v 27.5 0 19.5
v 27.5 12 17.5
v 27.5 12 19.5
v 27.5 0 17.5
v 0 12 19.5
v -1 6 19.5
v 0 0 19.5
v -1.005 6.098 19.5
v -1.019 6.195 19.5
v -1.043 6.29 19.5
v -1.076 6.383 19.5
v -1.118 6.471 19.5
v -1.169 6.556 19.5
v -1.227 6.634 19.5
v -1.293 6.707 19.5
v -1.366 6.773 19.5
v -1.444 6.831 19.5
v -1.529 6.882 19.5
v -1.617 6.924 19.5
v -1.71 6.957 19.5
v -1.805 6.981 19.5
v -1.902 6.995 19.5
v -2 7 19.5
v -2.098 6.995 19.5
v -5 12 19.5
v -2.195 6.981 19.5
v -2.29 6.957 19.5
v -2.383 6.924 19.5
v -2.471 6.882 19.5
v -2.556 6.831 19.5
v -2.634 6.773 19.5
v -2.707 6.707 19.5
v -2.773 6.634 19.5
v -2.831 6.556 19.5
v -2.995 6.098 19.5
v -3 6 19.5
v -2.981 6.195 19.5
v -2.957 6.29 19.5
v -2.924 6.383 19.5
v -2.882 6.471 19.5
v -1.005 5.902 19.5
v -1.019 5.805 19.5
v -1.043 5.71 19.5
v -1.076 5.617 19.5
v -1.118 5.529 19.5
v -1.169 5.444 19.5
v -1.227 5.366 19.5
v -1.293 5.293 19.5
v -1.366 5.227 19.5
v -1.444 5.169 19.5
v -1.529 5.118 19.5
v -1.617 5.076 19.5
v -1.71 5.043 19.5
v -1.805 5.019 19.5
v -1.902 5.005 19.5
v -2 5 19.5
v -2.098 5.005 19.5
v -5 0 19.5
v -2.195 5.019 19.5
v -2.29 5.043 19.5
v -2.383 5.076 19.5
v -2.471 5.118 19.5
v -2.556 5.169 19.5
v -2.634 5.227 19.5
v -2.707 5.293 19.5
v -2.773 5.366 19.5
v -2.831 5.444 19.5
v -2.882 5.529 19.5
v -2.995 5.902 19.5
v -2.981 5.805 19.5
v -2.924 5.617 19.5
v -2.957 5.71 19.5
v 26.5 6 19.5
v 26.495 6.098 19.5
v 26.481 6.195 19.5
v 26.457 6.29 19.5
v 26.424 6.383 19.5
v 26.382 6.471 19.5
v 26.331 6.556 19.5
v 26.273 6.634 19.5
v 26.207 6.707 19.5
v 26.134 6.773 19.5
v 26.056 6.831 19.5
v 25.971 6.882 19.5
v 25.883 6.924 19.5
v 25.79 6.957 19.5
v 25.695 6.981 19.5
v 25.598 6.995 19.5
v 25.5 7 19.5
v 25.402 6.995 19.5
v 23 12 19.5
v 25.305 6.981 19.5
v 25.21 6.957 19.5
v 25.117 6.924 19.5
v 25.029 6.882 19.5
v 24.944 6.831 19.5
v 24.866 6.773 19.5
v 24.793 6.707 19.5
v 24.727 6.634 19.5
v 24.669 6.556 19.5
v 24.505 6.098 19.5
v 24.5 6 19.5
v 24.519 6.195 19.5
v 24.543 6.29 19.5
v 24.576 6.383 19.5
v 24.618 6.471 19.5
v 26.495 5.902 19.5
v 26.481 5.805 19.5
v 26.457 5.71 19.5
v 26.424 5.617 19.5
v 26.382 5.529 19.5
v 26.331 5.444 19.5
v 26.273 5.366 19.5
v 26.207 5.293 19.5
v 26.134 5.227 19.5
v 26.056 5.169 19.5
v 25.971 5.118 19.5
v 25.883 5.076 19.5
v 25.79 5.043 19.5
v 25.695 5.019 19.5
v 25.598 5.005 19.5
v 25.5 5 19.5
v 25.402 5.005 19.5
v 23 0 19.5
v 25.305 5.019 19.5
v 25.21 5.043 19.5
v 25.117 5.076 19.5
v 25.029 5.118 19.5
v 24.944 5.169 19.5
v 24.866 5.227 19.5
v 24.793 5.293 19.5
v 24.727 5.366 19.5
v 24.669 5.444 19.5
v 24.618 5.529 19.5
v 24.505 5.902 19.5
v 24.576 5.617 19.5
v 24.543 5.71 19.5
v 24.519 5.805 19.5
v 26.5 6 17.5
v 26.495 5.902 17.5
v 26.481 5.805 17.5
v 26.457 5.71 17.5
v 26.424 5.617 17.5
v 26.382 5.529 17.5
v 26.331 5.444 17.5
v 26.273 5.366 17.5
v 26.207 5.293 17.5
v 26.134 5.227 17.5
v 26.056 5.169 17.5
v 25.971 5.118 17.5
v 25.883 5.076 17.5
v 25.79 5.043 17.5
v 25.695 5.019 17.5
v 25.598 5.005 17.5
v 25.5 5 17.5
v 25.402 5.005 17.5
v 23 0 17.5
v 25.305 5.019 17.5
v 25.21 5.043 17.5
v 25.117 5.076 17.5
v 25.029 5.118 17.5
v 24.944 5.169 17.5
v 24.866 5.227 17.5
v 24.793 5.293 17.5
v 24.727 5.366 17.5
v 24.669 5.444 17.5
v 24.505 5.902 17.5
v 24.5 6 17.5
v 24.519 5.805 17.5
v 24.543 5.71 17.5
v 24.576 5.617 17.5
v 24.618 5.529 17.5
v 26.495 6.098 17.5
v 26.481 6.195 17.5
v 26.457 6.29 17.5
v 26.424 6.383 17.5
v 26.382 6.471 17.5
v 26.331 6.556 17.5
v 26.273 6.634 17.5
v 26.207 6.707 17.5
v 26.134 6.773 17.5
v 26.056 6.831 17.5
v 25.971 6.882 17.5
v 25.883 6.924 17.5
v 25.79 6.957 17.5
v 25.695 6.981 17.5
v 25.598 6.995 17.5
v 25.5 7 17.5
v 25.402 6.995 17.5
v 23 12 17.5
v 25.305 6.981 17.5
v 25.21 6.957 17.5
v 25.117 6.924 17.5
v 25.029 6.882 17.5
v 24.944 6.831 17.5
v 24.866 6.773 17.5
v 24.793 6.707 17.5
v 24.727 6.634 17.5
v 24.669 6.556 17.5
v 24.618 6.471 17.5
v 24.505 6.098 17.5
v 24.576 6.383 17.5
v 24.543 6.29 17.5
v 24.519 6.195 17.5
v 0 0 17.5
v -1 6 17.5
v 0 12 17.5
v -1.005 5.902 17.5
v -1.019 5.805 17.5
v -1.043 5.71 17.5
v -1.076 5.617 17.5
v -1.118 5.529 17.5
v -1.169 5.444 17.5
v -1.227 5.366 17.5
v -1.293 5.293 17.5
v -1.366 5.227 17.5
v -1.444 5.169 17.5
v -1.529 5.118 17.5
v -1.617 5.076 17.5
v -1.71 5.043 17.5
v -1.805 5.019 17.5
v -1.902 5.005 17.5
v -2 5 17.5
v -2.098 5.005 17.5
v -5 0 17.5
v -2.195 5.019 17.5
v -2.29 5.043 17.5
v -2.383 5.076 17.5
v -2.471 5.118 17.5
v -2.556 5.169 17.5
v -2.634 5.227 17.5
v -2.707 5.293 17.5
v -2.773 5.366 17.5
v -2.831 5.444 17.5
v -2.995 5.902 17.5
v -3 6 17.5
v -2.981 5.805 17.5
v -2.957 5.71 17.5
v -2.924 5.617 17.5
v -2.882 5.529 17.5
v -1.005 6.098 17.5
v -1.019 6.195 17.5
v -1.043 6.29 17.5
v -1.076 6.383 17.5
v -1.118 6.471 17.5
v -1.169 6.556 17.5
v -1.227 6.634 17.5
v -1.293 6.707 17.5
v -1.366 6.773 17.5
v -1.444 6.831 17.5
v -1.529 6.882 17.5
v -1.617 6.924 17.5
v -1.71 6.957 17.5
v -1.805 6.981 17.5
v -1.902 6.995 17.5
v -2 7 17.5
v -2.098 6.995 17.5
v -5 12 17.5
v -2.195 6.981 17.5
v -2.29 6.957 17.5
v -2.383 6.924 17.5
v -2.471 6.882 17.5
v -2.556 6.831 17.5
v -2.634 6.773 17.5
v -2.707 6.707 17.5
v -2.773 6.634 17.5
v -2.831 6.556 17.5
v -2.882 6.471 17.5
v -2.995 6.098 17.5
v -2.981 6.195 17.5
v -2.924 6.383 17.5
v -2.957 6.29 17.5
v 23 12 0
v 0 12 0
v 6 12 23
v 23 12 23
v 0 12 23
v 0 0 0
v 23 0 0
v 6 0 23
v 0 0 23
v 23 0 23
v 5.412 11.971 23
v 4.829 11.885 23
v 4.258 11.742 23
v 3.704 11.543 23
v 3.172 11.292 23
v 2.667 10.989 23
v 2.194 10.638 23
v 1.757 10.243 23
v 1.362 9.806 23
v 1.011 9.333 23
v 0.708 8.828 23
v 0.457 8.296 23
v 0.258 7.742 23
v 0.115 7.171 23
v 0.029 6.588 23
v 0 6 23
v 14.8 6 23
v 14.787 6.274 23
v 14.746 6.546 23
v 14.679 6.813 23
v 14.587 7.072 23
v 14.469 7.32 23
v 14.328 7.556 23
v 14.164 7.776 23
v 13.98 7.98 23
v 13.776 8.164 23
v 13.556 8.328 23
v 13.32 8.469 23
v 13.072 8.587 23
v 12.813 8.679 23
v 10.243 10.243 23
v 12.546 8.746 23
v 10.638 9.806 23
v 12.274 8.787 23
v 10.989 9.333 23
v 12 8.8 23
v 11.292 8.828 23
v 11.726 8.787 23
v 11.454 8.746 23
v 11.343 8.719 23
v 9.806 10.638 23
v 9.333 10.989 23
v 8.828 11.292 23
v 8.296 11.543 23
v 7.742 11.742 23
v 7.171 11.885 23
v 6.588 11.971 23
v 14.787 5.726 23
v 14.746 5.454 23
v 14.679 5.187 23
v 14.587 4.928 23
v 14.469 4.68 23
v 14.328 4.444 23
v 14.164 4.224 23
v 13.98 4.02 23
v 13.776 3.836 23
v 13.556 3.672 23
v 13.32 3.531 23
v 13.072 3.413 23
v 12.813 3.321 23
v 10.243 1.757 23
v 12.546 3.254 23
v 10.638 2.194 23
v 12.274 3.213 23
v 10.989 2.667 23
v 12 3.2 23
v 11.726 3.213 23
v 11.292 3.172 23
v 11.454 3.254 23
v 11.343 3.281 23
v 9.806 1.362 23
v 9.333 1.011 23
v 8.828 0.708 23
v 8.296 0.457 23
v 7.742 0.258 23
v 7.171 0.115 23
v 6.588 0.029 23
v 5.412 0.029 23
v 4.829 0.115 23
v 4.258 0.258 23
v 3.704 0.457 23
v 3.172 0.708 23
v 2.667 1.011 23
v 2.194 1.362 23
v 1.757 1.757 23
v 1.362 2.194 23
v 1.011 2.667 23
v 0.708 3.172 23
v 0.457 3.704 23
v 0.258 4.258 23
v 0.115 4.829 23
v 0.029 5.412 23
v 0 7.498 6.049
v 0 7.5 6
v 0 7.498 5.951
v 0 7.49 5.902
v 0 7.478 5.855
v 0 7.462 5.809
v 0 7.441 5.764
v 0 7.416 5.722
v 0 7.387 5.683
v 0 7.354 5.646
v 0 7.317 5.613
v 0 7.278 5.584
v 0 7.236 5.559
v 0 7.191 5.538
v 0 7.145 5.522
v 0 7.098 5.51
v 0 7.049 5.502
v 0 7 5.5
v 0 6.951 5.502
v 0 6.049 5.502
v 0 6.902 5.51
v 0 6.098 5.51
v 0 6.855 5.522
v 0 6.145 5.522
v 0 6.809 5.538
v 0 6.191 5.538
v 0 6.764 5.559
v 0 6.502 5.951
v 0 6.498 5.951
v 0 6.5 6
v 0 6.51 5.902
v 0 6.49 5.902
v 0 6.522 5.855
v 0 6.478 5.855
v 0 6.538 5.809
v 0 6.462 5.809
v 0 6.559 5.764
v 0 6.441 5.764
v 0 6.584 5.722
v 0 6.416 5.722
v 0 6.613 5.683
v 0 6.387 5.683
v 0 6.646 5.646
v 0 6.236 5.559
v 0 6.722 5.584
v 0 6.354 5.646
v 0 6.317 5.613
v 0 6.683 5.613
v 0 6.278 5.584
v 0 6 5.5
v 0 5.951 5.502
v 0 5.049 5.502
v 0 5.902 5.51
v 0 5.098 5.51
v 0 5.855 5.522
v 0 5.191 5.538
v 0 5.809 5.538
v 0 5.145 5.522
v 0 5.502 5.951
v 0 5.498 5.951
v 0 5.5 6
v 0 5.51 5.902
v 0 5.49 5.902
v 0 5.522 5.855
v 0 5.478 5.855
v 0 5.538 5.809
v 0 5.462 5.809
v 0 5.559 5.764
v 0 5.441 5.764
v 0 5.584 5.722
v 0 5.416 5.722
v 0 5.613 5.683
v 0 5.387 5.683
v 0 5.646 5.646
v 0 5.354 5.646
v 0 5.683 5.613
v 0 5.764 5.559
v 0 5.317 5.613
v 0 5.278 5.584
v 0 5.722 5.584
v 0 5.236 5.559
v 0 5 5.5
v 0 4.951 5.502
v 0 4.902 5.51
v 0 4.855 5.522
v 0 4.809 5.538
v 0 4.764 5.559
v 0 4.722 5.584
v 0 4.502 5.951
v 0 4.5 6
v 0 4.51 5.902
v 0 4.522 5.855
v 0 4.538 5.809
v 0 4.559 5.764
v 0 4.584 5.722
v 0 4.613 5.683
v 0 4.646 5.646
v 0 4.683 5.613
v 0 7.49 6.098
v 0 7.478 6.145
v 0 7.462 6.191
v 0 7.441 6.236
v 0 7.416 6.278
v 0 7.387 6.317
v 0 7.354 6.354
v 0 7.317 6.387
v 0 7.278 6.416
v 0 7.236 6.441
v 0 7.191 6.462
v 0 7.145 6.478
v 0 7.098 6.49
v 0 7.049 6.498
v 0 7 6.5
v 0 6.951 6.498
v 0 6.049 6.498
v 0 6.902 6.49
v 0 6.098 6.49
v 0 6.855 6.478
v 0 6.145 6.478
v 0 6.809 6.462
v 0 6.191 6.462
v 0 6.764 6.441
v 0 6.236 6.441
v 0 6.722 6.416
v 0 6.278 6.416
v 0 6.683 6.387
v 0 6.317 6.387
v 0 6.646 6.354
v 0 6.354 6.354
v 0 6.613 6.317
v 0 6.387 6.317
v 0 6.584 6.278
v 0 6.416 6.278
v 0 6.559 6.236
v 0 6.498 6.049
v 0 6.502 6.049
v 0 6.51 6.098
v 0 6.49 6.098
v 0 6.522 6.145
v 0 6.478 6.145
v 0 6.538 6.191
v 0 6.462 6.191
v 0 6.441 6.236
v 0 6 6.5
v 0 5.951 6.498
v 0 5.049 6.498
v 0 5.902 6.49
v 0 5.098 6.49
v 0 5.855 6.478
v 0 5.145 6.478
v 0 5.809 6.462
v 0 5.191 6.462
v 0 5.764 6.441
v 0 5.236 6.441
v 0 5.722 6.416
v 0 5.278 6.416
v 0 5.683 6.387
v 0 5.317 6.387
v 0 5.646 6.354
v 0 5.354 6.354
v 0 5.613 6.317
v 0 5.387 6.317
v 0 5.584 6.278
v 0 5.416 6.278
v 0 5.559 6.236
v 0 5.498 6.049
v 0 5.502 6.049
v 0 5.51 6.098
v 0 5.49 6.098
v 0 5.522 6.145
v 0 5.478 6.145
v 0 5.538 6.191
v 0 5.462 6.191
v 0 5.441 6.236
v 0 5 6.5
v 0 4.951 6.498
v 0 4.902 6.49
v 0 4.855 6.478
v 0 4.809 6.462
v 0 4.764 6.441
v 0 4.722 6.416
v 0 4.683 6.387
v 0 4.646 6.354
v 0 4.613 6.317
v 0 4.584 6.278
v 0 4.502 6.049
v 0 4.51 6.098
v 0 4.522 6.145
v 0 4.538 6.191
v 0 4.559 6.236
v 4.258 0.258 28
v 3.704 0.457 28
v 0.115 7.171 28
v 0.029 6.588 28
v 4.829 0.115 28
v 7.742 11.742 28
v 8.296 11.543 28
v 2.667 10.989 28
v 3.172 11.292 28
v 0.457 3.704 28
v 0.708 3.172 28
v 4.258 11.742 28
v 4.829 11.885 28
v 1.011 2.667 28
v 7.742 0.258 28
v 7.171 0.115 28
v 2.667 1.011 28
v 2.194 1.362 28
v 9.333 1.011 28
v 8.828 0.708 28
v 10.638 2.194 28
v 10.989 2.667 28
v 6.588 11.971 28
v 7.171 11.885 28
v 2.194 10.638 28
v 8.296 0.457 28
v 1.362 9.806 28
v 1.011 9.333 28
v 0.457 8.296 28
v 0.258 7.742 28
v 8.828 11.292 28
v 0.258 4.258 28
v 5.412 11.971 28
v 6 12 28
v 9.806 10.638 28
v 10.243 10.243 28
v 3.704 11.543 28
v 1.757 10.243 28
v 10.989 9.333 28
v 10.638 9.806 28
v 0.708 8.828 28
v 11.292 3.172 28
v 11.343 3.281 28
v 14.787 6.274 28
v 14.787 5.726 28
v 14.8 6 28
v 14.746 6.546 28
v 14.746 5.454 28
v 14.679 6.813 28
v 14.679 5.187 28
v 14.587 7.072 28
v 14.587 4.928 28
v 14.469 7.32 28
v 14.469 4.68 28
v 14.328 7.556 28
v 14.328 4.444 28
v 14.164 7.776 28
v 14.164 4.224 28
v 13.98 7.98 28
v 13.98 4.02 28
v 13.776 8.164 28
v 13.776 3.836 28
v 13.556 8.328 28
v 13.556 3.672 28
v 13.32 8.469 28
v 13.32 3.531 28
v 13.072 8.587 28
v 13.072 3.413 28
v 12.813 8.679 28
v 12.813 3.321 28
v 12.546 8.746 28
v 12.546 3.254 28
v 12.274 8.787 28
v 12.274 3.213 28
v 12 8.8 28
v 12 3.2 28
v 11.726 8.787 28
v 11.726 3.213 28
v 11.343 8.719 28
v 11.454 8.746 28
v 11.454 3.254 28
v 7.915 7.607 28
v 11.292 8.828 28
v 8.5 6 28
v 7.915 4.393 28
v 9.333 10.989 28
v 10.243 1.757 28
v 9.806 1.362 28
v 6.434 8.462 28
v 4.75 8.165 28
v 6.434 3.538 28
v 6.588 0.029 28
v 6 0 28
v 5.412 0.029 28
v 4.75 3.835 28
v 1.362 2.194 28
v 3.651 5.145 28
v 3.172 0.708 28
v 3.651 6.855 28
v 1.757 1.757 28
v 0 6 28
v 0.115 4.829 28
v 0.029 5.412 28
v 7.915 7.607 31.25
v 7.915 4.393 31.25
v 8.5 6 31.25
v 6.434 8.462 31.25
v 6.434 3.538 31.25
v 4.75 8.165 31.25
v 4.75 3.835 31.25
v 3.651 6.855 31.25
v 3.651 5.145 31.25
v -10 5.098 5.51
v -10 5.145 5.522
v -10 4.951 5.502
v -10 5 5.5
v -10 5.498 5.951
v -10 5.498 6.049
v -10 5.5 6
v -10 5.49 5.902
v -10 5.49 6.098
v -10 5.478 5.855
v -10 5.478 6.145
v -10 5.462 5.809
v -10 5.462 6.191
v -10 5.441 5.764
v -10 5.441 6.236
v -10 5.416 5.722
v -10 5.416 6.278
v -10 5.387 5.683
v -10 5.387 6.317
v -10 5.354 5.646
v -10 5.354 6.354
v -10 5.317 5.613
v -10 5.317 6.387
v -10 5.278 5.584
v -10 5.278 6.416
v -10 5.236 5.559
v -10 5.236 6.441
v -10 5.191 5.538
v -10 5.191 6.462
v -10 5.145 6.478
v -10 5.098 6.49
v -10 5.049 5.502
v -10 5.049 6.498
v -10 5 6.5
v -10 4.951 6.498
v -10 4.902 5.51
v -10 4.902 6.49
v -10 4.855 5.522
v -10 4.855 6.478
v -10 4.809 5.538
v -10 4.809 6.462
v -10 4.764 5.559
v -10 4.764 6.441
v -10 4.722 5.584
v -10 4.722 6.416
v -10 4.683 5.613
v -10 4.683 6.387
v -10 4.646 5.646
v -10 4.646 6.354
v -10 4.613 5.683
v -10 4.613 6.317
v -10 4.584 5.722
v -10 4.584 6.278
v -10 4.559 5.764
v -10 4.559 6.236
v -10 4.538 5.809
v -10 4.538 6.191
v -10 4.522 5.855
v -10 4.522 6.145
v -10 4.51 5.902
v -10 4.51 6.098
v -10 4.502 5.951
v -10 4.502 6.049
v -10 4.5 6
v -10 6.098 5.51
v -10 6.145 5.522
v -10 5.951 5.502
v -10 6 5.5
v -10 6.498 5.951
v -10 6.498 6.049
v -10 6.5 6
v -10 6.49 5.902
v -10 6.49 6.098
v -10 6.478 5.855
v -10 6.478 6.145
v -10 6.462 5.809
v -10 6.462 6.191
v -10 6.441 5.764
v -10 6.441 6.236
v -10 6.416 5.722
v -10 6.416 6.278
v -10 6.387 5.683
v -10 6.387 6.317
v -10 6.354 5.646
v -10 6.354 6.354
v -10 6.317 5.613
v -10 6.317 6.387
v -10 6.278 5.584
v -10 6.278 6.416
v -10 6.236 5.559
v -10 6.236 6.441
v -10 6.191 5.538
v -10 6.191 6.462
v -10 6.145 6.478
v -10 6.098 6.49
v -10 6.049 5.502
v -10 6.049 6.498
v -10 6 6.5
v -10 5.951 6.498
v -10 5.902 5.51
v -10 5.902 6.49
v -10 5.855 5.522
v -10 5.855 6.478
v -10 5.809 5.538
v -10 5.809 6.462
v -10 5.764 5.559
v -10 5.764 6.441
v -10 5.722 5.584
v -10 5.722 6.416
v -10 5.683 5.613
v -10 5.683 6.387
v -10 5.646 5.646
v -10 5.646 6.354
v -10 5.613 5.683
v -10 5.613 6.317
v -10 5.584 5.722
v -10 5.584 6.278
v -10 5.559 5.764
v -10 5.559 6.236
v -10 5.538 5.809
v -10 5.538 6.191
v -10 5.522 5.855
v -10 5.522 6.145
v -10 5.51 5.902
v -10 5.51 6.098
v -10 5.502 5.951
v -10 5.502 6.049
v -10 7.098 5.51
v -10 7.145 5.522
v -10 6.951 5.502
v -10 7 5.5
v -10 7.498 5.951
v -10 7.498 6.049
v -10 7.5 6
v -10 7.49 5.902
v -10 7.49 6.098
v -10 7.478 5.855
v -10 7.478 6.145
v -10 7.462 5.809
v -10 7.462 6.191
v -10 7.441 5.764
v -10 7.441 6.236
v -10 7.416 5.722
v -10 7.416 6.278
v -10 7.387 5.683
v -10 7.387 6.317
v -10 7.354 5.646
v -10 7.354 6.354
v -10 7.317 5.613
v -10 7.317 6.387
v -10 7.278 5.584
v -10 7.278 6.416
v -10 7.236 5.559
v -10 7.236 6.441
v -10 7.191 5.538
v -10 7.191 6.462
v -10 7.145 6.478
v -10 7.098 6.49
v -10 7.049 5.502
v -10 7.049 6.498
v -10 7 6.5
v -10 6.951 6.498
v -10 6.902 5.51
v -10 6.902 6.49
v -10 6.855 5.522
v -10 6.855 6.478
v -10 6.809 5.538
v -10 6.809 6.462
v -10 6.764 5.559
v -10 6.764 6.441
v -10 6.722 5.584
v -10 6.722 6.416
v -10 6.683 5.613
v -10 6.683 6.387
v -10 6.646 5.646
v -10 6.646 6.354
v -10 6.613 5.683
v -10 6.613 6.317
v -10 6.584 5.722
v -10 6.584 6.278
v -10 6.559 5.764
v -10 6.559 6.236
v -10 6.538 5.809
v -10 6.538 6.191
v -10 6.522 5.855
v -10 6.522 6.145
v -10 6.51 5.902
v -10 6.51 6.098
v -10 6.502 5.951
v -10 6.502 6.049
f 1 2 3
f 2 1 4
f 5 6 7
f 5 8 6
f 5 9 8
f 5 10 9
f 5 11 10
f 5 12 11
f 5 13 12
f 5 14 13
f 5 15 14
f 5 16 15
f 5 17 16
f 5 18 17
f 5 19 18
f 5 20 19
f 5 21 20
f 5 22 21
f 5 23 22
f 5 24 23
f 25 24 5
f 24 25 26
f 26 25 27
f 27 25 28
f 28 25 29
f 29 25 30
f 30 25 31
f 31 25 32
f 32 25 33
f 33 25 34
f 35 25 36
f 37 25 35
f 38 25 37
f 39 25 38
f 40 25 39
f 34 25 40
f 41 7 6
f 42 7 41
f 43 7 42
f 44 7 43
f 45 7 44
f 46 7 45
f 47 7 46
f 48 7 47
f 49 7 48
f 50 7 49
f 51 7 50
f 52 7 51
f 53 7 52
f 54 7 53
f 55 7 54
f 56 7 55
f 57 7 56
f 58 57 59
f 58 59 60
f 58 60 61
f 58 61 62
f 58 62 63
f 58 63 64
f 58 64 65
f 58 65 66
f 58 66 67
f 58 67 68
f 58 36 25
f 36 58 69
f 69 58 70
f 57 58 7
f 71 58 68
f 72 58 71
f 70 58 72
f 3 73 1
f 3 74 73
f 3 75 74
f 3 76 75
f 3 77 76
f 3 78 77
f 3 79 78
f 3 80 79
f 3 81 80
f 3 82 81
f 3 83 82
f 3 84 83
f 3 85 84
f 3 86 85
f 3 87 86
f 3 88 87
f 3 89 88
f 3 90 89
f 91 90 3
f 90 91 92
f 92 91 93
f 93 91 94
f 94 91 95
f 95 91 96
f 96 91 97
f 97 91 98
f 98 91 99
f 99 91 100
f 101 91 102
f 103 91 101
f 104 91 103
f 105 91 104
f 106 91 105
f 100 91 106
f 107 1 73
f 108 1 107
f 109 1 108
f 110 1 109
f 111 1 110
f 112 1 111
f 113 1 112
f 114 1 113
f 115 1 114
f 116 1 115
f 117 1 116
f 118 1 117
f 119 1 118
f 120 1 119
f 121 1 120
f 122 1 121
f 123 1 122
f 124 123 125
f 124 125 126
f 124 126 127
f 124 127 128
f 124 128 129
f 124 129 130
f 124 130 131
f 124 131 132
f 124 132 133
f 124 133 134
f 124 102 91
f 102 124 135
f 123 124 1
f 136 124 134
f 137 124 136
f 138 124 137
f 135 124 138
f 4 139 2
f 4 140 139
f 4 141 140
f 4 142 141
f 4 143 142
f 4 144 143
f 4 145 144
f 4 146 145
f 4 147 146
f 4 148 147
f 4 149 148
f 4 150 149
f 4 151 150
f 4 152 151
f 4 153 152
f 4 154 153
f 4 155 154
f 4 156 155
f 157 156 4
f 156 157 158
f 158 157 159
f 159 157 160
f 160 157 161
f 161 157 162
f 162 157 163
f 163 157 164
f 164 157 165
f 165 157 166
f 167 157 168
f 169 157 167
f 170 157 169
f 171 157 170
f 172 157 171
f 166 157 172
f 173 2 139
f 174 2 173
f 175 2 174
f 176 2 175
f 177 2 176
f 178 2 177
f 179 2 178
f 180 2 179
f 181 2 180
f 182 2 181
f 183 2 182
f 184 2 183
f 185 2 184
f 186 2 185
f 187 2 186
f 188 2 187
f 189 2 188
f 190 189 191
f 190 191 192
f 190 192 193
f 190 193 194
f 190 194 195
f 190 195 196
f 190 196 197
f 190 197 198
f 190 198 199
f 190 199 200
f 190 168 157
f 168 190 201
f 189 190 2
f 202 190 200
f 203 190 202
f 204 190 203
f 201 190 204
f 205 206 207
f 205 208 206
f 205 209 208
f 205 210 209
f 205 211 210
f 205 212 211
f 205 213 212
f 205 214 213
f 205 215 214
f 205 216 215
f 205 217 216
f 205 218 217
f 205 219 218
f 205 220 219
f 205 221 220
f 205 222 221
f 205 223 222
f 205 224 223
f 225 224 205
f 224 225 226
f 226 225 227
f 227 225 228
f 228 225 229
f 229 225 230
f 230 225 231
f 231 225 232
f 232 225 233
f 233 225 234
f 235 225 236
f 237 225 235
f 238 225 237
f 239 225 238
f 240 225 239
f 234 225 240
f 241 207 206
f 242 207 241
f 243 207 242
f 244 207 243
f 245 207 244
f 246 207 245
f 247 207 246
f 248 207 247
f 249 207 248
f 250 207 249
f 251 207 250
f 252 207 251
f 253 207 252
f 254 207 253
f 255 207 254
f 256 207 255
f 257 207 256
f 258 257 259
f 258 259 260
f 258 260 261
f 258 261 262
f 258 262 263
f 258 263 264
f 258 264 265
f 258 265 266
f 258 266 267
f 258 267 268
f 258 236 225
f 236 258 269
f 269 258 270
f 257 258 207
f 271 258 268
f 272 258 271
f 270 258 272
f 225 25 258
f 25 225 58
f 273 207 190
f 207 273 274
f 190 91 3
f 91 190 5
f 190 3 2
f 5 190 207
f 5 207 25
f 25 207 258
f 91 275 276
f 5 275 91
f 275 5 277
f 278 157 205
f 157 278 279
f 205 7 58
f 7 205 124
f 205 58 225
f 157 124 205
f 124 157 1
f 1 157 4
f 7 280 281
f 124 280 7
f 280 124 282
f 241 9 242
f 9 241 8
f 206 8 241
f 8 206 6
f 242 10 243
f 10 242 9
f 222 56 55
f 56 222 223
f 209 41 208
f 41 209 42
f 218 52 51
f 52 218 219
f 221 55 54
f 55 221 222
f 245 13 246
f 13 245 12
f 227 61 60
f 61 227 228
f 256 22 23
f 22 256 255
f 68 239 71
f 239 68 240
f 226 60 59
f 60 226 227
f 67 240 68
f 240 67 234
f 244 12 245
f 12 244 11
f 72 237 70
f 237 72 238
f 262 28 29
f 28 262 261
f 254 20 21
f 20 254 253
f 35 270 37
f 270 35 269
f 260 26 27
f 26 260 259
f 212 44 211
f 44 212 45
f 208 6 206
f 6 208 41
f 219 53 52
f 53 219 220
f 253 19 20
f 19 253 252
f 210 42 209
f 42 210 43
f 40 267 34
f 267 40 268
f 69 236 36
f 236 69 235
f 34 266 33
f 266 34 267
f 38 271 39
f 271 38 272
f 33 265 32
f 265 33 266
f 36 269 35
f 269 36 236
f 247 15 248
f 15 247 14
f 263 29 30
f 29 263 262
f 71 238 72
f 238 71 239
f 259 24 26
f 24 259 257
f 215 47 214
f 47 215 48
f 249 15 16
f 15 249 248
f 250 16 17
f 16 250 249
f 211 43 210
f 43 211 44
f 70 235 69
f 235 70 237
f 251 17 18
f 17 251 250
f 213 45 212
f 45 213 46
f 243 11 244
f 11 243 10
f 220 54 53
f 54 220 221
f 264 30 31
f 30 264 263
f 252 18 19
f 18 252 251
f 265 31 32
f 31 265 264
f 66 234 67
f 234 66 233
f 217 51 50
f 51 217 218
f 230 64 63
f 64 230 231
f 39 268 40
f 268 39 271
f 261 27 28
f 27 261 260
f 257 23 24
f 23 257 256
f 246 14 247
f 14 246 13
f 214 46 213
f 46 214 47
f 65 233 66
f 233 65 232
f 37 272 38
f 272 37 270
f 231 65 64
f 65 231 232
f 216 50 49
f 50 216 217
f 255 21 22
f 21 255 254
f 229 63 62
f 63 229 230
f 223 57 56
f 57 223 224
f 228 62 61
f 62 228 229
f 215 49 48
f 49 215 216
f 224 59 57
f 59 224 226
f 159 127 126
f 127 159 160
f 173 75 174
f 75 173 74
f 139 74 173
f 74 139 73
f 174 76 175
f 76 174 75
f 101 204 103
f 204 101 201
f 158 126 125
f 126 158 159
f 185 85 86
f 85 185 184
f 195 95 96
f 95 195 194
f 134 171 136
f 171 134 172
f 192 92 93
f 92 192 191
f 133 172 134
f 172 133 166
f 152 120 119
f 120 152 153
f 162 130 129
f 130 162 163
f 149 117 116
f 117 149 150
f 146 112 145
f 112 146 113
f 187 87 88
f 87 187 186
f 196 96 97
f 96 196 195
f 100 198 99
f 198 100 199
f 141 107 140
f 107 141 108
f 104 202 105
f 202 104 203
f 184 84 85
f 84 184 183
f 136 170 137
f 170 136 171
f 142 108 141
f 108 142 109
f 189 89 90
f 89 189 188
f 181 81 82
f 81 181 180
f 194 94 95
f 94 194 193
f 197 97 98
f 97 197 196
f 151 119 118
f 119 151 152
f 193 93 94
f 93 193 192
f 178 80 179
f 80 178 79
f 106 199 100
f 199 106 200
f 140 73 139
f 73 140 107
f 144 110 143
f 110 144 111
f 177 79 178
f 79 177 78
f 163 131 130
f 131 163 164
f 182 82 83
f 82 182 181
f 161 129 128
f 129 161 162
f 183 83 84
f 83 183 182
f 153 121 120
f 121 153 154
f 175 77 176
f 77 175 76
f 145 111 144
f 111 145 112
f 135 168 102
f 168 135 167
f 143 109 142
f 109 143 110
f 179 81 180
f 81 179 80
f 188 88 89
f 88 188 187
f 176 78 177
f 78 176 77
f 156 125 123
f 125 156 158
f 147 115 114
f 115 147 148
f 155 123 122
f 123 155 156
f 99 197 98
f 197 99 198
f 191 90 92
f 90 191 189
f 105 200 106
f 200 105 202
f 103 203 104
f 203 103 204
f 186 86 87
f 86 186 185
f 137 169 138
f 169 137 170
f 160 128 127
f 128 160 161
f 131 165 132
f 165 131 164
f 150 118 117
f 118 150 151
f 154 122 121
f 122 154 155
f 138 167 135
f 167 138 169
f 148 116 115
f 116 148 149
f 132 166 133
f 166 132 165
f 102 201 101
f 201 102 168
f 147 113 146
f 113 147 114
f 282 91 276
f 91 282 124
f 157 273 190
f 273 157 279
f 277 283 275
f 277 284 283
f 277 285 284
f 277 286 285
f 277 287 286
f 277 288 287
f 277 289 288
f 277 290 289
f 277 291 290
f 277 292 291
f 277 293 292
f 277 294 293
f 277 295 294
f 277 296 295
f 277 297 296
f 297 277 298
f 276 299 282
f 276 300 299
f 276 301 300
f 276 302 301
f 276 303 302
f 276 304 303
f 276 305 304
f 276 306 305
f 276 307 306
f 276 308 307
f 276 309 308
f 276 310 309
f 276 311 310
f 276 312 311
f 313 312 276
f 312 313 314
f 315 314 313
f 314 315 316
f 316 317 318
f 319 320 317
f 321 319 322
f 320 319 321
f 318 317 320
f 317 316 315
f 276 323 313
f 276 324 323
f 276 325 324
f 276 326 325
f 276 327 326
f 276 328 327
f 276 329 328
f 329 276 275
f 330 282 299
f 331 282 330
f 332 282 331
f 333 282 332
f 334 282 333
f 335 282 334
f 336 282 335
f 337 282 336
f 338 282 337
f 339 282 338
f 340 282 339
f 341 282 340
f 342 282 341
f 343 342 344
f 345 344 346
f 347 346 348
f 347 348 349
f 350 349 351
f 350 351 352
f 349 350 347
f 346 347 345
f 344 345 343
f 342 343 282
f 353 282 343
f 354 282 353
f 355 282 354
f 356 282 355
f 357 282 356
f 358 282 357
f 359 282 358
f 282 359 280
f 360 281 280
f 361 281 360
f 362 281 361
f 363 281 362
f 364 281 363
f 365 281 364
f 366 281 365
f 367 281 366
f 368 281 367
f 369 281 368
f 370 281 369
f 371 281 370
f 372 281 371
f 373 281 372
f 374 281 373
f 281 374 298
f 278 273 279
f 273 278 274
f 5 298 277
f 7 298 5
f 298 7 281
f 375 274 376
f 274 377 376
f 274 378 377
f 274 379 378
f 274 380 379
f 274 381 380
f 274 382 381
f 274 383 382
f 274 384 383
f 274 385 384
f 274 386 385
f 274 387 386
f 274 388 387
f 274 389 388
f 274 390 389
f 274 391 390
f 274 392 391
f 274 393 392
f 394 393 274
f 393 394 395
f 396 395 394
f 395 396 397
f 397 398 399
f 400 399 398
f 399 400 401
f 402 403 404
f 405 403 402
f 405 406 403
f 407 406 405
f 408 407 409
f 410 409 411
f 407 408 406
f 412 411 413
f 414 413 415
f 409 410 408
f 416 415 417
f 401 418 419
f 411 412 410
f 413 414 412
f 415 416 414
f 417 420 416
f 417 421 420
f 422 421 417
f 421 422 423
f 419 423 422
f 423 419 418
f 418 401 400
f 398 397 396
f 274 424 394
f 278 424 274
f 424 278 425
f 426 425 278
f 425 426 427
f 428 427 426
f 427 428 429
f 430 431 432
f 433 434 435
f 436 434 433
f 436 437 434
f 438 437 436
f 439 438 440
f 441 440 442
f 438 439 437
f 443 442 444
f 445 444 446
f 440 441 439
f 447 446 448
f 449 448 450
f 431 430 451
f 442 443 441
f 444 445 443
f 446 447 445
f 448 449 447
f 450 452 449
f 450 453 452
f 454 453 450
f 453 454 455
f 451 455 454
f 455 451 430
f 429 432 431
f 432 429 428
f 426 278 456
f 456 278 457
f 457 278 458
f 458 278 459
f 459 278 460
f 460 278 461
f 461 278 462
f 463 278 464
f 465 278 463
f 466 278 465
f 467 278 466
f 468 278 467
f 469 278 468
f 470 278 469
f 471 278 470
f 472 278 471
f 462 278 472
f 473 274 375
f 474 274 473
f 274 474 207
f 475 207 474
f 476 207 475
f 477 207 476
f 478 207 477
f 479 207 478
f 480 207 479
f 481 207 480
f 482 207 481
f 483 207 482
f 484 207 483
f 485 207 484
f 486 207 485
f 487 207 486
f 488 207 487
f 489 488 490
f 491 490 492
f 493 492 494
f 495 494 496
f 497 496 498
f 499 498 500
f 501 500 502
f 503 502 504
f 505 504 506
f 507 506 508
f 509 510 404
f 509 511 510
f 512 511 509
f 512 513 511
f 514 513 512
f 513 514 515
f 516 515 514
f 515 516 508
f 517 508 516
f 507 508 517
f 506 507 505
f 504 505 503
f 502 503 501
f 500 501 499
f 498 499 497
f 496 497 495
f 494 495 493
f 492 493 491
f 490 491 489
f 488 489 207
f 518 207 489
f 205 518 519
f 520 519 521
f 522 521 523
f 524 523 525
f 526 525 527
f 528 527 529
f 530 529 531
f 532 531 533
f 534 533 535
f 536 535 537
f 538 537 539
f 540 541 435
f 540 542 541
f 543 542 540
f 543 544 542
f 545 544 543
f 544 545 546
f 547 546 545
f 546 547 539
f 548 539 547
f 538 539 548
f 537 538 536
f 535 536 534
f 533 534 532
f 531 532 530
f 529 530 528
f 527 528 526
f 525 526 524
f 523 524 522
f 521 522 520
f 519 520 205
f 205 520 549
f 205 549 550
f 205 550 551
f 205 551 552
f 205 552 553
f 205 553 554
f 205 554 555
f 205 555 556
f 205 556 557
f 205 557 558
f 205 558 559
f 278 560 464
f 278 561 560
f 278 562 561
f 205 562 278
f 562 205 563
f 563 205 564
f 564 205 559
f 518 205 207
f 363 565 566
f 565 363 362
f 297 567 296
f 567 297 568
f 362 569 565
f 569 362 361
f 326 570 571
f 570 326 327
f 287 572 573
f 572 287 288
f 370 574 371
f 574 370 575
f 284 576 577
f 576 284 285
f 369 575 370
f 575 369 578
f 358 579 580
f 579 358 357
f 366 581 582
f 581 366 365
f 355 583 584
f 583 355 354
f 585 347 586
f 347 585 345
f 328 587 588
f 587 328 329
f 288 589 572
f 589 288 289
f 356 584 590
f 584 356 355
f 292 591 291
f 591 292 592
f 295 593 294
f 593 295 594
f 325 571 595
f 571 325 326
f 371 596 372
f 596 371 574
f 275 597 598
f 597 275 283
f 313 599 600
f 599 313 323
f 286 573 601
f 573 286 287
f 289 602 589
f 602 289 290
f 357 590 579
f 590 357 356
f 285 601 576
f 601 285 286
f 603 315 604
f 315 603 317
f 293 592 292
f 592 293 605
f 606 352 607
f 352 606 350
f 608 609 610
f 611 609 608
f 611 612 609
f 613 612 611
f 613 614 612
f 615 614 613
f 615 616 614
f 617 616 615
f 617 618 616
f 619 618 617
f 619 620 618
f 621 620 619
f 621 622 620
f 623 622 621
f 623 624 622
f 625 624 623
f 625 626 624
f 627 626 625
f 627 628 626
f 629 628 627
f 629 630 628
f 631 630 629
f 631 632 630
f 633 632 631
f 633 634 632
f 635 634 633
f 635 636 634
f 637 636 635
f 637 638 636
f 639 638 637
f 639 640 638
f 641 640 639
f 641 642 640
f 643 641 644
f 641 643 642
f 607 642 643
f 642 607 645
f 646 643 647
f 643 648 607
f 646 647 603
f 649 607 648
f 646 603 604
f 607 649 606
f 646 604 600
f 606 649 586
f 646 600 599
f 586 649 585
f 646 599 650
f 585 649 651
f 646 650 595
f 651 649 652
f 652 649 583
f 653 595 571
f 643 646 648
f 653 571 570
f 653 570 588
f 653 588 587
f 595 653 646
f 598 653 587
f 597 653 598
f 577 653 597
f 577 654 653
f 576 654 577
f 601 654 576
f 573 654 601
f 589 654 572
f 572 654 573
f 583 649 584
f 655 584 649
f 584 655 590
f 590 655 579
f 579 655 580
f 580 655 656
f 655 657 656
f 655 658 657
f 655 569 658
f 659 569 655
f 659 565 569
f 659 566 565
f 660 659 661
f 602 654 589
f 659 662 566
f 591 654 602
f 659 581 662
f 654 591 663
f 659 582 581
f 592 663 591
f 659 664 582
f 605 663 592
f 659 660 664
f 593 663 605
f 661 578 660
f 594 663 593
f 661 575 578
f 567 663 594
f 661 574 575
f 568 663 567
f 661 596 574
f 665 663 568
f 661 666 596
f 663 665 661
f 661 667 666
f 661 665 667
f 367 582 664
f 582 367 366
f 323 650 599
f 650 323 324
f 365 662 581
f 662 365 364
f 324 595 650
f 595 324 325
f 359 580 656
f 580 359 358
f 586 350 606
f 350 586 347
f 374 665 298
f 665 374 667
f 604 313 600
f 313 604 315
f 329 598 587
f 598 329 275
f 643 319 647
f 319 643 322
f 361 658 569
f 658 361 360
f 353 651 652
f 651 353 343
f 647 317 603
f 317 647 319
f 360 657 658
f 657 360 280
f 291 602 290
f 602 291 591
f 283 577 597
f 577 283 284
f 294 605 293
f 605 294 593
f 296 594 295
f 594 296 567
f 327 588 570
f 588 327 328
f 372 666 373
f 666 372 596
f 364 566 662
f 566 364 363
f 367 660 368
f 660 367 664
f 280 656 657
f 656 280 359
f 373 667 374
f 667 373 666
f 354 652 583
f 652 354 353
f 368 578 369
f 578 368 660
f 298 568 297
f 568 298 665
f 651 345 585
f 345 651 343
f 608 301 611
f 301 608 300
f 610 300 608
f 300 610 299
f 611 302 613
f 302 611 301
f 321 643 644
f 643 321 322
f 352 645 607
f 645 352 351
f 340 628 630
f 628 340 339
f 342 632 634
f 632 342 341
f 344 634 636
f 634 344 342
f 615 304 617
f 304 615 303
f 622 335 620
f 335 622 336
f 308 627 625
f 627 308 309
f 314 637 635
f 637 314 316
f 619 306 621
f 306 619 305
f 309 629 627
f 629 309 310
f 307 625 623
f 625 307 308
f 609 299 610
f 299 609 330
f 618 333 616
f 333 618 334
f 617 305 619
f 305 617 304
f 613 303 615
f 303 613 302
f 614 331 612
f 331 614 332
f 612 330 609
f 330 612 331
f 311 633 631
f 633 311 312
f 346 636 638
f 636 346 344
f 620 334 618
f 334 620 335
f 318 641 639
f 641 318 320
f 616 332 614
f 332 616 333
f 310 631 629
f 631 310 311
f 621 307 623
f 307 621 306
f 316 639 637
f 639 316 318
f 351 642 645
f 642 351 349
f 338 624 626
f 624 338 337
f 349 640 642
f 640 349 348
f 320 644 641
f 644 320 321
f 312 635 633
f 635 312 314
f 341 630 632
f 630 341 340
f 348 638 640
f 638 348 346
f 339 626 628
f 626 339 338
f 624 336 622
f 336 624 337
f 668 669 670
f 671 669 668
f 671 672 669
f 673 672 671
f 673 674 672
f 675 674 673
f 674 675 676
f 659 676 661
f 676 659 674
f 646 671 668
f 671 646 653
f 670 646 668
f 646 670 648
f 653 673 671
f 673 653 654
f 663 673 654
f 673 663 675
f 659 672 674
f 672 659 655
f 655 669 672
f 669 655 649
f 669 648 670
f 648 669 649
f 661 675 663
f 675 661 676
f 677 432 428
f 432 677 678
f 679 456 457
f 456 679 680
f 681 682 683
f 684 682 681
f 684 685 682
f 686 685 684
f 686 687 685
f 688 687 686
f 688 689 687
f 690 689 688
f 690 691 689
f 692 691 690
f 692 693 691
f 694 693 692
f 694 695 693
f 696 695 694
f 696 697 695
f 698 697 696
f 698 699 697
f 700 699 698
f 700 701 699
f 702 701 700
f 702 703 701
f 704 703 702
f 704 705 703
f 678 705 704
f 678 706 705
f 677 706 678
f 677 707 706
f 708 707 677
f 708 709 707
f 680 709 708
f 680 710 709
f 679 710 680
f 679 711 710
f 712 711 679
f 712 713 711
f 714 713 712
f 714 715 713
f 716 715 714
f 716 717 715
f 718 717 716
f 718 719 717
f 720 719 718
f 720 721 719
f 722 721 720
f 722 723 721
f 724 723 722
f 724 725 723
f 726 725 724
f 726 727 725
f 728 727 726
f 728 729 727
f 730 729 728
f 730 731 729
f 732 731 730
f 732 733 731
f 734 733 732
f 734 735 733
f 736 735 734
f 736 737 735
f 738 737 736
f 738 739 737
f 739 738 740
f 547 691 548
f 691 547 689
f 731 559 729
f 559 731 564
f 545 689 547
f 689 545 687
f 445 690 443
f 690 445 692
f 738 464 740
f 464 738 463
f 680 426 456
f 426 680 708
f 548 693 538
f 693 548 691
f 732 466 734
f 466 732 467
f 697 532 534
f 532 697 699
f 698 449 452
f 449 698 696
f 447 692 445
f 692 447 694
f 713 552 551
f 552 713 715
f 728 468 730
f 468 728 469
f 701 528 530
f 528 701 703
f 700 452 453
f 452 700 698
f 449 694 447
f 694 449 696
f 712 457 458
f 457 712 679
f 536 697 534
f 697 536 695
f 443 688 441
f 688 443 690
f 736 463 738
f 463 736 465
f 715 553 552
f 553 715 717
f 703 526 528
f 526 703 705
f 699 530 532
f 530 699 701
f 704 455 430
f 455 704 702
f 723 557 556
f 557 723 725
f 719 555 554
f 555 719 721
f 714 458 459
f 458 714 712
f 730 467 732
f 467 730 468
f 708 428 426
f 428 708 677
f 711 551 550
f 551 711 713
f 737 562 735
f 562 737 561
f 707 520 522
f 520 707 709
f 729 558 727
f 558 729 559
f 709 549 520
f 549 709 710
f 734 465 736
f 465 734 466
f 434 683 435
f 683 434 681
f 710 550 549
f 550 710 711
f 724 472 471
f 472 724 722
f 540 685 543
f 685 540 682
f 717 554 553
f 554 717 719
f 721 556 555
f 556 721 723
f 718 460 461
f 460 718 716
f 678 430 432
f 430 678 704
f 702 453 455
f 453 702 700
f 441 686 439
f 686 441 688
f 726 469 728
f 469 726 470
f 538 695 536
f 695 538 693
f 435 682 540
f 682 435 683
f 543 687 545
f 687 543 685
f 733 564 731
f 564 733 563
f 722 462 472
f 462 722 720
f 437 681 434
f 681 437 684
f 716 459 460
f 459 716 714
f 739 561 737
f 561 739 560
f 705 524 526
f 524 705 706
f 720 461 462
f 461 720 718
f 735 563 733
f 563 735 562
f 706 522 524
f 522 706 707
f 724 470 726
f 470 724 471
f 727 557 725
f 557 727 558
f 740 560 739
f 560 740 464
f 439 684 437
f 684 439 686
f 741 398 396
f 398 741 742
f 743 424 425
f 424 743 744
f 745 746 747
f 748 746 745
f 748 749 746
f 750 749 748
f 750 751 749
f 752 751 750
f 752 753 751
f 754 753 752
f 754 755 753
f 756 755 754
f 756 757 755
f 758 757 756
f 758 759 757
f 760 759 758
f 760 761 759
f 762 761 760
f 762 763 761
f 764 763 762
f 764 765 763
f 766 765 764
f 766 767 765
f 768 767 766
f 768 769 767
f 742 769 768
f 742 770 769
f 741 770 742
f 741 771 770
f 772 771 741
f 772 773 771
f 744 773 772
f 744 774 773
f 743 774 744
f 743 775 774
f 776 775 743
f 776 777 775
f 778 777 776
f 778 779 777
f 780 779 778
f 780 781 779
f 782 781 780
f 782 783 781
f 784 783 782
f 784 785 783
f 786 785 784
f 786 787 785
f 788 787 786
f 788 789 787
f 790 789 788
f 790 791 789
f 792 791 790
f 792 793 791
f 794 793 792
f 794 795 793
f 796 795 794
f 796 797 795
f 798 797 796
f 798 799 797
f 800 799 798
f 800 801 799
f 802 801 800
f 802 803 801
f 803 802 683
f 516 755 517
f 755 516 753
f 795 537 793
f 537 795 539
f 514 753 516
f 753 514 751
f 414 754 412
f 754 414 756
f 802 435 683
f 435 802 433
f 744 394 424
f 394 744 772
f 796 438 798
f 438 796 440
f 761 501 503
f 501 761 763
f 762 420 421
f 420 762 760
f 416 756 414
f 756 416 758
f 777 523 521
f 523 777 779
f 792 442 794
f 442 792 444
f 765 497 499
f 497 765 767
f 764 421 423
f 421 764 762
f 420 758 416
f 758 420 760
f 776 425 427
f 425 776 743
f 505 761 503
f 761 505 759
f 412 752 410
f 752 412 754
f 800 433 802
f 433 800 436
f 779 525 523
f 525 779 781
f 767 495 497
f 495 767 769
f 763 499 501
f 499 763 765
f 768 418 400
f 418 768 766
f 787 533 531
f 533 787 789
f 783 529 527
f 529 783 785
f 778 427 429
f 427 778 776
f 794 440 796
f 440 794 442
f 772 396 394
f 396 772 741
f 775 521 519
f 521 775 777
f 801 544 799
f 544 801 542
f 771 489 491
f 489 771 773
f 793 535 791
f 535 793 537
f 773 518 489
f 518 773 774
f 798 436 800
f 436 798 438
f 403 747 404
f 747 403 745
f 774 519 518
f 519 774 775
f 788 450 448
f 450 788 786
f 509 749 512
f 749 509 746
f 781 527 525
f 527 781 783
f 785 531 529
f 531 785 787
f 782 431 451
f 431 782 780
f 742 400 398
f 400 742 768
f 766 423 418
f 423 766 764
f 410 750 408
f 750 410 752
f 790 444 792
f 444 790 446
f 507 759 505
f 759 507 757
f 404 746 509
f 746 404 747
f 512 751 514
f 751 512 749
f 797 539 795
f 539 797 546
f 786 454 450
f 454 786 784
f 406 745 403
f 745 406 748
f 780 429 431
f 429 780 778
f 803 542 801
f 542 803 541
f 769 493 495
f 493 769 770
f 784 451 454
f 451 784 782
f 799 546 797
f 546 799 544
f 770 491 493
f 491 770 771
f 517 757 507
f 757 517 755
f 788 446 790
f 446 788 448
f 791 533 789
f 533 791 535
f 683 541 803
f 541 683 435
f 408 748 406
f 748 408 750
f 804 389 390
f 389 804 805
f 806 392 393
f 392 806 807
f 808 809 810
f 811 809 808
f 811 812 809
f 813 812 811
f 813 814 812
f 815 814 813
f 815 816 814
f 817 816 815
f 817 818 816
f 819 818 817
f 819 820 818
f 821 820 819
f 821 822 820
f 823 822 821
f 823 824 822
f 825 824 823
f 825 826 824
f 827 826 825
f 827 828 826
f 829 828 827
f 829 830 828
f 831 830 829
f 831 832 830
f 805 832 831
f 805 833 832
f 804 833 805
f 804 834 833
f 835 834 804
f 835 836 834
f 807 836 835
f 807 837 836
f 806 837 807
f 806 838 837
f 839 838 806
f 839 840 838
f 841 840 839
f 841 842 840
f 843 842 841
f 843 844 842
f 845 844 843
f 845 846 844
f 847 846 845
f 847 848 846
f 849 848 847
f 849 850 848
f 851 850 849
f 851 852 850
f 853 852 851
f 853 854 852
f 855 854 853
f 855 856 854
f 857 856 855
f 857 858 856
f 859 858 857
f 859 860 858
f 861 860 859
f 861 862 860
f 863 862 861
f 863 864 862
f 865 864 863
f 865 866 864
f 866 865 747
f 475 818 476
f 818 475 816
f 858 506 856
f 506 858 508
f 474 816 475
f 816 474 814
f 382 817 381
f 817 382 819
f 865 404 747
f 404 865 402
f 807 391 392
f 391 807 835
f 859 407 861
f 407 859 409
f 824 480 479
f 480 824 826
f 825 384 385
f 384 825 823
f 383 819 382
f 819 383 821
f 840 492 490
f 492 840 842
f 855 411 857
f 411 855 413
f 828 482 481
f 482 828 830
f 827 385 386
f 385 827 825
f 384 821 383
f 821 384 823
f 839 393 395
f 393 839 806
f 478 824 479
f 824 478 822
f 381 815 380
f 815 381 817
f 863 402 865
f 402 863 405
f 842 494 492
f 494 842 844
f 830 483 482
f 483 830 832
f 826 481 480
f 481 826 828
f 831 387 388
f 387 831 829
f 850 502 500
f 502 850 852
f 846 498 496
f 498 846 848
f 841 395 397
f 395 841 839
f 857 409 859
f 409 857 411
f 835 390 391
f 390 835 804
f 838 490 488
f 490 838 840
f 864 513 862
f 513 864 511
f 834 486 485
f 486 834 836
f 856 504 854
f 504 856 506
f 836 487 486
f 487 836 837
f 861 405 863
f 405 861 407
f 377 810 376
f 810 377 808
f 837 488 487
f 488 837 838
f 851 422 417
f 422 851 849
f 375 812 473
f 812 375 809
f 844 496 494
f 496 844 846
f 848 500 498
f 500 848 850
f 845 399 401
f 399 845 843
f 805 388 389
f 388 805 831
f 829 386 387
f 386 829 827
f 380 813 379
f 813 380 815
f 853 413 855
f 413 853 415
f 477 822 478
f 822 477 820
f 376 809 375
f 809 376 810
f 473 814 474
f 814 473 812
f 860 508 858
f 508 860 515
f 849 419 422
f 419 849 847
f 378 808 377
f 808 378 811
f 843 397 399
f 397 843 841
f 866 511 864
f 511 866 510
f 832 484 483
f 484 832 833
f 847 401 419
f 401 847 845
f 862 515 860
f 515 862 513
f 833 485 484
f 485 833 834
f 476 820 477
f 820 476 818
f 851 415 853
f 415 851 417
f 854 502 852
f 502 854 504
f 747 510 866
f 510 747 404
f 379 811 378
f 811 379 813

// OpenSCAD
$fn=64;

module micro_servo(){
    
    union(){
        color("blue") cube([23,12,23]);
        translate([6,6,23]) color("blue") cylinder(r=6,h=5);
        translate([6+6,6,23]) color("blue") cylinder(r=2.8,h=5);

        // shaft
        translate([6,6,23+5]) color("white") cylinder(r=2.5,h=3.25,$fn=9);
    
        // mounting plate
        difference(){
           translate([-5,0,17.5]) color("blue") cube([32.5,12,2]);    
           translate([-2,6,17.5-0.1]) cylinder(r=1,h=2.2); 
           translate([25.5,6,17.5-0.1]) cylinder(r=1,h=2.2); 
            
        }
        
        // wires
        translate([-10,5,6]) rotate([0,90,0]) color("Yellow") cylinder(r=0.5,h=10);
        translate([-10,6,6]) rotate([0,90,0]) color("Crimson") cylinder(r=0.5,h=10);
        translate([-10,7,6]) rotate([0,90,0]) color("SaddleBrown") cylinder(r=0.5,h=10);
    
    }    

}

micro_servo();
